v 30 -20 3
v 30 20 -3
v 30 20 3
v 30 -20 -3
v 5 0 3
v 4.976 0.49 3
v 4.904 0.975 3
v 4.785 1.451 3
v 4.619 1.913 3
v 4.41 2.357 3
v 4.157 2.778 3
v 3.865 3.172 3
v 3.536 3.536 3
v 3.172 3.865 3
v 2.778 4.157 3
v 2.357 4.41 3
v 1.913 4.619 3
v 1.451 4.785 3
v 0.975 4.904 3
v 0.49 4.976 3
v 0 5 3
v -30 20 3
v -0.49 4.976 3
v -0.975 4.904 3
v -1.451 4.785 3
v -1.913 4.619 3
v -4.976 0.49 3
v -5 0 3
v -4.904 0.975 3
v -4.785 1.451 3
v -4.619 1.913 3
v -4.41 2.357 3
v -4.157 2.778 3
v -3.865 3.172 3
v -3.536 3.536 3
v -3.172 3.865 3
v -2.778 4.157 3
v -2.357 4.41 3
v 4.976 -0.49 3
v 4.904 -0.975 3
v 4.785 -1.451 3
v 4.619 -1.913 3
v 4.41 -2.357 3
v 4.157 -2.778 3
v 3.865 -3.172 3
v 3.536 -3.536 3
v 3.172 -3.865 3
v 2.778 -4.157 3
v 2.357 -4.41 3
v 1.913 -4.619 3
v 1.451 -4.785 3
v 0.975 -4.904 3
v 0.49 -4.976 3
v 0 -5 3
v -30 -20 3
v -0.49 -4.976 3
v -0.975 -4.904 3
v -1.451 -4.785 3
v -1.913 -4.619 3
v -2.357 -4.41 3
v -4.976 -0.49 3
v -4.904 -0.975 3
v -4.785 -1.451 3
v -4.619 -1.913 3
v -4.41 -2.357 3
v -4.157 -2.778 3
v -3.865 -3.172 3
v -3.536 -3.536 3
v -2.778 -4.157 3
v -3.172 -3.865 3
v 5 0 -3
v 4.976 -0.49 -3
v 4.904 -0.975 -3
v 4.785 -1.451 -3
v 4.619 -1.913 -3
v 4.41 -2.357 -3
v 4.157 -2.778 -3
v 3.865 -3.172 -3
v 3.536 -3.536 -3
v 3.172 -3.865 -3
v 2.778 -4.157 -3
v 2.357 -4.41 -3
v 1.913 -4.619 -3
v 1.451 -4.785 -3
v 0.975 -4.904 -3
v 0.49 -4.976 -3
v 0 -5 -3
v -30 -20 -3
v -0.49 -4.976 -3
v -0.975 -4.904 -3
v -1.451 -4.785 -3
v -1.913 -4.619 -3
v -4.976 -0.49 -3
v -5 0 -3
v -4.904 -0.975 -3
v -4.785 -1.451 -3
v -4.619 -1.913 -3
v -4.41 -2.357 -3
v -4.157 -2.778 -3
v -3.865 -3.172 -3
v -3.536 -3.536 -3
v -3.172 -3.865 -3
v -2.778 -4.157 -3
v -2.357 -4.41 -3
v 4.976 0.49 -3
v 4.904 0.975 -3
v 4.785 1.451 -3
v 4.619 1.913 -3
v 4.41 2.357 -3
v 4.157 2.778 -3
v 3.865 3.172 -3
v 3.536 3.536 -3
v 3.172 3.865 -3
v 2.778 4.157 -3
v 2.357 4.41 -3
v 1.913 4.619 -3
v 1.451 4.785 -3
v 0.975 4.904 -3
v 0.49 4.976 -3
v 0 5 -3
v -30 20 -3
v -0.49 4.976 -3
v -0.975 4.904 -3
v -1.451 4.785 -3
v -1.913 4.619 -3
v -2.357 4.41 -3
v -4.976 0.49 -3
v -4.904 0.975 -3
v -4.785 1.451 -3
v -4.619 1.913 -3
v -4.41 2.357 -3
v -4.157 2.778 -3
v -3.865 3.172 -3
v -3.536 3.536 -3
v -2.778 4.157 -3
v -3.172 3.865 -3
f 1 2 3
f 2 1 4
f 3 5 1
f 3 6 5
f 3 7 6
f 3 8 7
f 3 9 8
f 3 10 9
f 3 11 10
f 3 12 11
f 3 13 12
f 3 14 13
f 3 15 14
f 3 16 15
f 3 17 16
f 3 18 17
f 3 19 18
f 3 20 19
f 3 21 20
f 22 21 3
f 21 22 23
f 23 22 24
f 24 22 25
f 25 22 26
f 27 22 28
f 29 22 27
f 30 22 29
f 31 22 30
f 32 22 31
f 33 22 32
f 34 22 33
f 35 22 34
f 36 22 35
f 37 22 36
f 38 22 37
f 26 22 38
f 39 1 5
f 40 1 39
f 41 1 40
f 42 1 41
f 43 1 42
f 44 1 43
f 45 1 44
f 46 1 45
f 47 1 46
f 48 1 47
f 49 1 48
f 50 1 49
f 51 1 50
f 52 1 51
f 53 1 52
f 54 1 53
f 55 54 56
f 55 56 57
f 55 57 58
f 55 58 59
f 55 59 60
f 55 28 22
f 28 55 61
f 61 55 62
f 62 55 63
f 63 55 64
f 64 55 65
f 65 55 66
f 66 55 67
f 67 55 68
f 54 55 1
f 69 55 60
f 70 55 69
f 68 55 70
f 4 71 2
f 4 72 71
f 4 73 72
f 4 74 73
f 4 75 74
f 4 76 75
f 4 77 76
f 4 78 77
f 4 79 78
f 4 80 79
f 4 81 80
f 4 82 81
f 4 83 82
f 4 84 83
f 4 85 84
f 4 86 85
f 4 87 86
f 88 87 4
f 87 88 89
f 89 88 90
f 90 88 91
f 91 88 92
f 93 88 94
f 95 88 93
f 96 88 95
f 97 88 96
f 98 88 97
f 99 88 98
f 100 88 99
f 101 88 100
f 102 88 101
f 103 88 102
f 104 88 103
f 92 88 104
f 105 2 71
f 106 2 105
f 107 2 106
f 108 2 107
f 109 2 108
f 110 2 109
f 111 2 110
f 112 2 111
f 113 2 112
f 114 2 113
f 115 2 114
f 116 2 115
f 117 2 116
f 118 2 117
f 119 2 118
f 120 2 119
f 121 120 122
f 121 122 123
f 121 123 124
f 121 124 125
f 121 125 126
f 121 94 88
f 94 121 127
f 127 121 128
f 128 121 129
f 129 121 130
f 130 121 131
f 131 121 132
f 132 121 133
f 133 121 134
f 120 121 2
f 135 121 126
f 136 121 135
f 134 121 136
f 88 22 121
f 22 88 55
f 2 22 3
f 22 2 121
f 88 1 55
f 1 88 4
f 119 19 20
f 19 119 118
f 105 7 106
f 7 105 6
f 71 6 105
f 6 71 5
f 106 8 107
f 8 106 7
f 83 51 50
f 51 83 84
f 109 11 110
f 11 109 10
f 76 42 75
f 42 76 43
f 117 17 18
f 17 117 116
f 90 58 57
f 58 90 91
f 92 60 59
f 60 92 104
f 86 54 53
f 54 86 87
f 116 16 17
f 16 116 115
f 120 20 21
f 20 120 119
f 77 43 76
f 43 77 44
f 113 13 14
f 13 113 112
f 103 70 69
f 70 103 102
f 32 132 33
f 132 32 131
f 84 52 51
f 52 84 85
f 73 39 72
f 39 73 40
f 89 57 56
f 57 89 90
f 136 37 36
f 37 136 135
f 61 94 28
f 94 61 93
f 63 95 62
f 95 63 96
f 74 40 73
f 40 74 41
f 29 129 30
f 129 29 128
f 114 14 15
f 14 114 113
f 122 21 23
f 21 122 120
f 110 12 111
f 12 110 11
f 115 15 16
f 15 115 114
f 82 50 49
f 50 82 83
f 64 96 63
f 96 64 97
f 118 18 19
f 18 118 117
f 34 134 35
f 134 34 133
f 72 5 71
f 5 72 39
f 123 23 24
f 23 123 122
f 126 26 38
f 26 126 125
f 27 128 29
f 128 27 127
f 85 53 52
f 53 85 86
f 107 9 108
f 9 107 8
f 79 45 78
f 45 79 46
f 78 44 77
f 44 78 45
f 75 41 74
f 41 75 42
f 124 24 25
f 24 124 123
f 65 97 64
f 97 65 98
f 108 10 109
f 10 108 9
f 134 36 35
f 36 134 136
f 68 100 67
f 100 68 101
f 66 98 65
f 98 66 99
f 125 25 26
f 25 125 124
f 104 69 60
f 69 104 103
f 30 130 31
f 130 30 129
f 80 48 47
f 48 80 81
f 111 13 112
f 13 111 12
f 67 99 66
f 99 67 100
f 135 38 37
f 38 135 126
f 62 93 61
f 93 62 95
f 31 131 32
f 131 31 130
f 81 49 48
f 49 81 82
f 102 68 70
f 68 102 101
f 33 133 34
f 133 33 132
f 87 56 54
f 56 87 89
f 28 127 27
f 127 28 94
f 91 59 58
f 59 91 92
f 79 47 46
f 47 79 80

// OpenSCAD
$fn = 64;
difference() {
    cube([60, 40, 6], center = true);
    cylinder(h = 10, r = 5, center = true);
}
